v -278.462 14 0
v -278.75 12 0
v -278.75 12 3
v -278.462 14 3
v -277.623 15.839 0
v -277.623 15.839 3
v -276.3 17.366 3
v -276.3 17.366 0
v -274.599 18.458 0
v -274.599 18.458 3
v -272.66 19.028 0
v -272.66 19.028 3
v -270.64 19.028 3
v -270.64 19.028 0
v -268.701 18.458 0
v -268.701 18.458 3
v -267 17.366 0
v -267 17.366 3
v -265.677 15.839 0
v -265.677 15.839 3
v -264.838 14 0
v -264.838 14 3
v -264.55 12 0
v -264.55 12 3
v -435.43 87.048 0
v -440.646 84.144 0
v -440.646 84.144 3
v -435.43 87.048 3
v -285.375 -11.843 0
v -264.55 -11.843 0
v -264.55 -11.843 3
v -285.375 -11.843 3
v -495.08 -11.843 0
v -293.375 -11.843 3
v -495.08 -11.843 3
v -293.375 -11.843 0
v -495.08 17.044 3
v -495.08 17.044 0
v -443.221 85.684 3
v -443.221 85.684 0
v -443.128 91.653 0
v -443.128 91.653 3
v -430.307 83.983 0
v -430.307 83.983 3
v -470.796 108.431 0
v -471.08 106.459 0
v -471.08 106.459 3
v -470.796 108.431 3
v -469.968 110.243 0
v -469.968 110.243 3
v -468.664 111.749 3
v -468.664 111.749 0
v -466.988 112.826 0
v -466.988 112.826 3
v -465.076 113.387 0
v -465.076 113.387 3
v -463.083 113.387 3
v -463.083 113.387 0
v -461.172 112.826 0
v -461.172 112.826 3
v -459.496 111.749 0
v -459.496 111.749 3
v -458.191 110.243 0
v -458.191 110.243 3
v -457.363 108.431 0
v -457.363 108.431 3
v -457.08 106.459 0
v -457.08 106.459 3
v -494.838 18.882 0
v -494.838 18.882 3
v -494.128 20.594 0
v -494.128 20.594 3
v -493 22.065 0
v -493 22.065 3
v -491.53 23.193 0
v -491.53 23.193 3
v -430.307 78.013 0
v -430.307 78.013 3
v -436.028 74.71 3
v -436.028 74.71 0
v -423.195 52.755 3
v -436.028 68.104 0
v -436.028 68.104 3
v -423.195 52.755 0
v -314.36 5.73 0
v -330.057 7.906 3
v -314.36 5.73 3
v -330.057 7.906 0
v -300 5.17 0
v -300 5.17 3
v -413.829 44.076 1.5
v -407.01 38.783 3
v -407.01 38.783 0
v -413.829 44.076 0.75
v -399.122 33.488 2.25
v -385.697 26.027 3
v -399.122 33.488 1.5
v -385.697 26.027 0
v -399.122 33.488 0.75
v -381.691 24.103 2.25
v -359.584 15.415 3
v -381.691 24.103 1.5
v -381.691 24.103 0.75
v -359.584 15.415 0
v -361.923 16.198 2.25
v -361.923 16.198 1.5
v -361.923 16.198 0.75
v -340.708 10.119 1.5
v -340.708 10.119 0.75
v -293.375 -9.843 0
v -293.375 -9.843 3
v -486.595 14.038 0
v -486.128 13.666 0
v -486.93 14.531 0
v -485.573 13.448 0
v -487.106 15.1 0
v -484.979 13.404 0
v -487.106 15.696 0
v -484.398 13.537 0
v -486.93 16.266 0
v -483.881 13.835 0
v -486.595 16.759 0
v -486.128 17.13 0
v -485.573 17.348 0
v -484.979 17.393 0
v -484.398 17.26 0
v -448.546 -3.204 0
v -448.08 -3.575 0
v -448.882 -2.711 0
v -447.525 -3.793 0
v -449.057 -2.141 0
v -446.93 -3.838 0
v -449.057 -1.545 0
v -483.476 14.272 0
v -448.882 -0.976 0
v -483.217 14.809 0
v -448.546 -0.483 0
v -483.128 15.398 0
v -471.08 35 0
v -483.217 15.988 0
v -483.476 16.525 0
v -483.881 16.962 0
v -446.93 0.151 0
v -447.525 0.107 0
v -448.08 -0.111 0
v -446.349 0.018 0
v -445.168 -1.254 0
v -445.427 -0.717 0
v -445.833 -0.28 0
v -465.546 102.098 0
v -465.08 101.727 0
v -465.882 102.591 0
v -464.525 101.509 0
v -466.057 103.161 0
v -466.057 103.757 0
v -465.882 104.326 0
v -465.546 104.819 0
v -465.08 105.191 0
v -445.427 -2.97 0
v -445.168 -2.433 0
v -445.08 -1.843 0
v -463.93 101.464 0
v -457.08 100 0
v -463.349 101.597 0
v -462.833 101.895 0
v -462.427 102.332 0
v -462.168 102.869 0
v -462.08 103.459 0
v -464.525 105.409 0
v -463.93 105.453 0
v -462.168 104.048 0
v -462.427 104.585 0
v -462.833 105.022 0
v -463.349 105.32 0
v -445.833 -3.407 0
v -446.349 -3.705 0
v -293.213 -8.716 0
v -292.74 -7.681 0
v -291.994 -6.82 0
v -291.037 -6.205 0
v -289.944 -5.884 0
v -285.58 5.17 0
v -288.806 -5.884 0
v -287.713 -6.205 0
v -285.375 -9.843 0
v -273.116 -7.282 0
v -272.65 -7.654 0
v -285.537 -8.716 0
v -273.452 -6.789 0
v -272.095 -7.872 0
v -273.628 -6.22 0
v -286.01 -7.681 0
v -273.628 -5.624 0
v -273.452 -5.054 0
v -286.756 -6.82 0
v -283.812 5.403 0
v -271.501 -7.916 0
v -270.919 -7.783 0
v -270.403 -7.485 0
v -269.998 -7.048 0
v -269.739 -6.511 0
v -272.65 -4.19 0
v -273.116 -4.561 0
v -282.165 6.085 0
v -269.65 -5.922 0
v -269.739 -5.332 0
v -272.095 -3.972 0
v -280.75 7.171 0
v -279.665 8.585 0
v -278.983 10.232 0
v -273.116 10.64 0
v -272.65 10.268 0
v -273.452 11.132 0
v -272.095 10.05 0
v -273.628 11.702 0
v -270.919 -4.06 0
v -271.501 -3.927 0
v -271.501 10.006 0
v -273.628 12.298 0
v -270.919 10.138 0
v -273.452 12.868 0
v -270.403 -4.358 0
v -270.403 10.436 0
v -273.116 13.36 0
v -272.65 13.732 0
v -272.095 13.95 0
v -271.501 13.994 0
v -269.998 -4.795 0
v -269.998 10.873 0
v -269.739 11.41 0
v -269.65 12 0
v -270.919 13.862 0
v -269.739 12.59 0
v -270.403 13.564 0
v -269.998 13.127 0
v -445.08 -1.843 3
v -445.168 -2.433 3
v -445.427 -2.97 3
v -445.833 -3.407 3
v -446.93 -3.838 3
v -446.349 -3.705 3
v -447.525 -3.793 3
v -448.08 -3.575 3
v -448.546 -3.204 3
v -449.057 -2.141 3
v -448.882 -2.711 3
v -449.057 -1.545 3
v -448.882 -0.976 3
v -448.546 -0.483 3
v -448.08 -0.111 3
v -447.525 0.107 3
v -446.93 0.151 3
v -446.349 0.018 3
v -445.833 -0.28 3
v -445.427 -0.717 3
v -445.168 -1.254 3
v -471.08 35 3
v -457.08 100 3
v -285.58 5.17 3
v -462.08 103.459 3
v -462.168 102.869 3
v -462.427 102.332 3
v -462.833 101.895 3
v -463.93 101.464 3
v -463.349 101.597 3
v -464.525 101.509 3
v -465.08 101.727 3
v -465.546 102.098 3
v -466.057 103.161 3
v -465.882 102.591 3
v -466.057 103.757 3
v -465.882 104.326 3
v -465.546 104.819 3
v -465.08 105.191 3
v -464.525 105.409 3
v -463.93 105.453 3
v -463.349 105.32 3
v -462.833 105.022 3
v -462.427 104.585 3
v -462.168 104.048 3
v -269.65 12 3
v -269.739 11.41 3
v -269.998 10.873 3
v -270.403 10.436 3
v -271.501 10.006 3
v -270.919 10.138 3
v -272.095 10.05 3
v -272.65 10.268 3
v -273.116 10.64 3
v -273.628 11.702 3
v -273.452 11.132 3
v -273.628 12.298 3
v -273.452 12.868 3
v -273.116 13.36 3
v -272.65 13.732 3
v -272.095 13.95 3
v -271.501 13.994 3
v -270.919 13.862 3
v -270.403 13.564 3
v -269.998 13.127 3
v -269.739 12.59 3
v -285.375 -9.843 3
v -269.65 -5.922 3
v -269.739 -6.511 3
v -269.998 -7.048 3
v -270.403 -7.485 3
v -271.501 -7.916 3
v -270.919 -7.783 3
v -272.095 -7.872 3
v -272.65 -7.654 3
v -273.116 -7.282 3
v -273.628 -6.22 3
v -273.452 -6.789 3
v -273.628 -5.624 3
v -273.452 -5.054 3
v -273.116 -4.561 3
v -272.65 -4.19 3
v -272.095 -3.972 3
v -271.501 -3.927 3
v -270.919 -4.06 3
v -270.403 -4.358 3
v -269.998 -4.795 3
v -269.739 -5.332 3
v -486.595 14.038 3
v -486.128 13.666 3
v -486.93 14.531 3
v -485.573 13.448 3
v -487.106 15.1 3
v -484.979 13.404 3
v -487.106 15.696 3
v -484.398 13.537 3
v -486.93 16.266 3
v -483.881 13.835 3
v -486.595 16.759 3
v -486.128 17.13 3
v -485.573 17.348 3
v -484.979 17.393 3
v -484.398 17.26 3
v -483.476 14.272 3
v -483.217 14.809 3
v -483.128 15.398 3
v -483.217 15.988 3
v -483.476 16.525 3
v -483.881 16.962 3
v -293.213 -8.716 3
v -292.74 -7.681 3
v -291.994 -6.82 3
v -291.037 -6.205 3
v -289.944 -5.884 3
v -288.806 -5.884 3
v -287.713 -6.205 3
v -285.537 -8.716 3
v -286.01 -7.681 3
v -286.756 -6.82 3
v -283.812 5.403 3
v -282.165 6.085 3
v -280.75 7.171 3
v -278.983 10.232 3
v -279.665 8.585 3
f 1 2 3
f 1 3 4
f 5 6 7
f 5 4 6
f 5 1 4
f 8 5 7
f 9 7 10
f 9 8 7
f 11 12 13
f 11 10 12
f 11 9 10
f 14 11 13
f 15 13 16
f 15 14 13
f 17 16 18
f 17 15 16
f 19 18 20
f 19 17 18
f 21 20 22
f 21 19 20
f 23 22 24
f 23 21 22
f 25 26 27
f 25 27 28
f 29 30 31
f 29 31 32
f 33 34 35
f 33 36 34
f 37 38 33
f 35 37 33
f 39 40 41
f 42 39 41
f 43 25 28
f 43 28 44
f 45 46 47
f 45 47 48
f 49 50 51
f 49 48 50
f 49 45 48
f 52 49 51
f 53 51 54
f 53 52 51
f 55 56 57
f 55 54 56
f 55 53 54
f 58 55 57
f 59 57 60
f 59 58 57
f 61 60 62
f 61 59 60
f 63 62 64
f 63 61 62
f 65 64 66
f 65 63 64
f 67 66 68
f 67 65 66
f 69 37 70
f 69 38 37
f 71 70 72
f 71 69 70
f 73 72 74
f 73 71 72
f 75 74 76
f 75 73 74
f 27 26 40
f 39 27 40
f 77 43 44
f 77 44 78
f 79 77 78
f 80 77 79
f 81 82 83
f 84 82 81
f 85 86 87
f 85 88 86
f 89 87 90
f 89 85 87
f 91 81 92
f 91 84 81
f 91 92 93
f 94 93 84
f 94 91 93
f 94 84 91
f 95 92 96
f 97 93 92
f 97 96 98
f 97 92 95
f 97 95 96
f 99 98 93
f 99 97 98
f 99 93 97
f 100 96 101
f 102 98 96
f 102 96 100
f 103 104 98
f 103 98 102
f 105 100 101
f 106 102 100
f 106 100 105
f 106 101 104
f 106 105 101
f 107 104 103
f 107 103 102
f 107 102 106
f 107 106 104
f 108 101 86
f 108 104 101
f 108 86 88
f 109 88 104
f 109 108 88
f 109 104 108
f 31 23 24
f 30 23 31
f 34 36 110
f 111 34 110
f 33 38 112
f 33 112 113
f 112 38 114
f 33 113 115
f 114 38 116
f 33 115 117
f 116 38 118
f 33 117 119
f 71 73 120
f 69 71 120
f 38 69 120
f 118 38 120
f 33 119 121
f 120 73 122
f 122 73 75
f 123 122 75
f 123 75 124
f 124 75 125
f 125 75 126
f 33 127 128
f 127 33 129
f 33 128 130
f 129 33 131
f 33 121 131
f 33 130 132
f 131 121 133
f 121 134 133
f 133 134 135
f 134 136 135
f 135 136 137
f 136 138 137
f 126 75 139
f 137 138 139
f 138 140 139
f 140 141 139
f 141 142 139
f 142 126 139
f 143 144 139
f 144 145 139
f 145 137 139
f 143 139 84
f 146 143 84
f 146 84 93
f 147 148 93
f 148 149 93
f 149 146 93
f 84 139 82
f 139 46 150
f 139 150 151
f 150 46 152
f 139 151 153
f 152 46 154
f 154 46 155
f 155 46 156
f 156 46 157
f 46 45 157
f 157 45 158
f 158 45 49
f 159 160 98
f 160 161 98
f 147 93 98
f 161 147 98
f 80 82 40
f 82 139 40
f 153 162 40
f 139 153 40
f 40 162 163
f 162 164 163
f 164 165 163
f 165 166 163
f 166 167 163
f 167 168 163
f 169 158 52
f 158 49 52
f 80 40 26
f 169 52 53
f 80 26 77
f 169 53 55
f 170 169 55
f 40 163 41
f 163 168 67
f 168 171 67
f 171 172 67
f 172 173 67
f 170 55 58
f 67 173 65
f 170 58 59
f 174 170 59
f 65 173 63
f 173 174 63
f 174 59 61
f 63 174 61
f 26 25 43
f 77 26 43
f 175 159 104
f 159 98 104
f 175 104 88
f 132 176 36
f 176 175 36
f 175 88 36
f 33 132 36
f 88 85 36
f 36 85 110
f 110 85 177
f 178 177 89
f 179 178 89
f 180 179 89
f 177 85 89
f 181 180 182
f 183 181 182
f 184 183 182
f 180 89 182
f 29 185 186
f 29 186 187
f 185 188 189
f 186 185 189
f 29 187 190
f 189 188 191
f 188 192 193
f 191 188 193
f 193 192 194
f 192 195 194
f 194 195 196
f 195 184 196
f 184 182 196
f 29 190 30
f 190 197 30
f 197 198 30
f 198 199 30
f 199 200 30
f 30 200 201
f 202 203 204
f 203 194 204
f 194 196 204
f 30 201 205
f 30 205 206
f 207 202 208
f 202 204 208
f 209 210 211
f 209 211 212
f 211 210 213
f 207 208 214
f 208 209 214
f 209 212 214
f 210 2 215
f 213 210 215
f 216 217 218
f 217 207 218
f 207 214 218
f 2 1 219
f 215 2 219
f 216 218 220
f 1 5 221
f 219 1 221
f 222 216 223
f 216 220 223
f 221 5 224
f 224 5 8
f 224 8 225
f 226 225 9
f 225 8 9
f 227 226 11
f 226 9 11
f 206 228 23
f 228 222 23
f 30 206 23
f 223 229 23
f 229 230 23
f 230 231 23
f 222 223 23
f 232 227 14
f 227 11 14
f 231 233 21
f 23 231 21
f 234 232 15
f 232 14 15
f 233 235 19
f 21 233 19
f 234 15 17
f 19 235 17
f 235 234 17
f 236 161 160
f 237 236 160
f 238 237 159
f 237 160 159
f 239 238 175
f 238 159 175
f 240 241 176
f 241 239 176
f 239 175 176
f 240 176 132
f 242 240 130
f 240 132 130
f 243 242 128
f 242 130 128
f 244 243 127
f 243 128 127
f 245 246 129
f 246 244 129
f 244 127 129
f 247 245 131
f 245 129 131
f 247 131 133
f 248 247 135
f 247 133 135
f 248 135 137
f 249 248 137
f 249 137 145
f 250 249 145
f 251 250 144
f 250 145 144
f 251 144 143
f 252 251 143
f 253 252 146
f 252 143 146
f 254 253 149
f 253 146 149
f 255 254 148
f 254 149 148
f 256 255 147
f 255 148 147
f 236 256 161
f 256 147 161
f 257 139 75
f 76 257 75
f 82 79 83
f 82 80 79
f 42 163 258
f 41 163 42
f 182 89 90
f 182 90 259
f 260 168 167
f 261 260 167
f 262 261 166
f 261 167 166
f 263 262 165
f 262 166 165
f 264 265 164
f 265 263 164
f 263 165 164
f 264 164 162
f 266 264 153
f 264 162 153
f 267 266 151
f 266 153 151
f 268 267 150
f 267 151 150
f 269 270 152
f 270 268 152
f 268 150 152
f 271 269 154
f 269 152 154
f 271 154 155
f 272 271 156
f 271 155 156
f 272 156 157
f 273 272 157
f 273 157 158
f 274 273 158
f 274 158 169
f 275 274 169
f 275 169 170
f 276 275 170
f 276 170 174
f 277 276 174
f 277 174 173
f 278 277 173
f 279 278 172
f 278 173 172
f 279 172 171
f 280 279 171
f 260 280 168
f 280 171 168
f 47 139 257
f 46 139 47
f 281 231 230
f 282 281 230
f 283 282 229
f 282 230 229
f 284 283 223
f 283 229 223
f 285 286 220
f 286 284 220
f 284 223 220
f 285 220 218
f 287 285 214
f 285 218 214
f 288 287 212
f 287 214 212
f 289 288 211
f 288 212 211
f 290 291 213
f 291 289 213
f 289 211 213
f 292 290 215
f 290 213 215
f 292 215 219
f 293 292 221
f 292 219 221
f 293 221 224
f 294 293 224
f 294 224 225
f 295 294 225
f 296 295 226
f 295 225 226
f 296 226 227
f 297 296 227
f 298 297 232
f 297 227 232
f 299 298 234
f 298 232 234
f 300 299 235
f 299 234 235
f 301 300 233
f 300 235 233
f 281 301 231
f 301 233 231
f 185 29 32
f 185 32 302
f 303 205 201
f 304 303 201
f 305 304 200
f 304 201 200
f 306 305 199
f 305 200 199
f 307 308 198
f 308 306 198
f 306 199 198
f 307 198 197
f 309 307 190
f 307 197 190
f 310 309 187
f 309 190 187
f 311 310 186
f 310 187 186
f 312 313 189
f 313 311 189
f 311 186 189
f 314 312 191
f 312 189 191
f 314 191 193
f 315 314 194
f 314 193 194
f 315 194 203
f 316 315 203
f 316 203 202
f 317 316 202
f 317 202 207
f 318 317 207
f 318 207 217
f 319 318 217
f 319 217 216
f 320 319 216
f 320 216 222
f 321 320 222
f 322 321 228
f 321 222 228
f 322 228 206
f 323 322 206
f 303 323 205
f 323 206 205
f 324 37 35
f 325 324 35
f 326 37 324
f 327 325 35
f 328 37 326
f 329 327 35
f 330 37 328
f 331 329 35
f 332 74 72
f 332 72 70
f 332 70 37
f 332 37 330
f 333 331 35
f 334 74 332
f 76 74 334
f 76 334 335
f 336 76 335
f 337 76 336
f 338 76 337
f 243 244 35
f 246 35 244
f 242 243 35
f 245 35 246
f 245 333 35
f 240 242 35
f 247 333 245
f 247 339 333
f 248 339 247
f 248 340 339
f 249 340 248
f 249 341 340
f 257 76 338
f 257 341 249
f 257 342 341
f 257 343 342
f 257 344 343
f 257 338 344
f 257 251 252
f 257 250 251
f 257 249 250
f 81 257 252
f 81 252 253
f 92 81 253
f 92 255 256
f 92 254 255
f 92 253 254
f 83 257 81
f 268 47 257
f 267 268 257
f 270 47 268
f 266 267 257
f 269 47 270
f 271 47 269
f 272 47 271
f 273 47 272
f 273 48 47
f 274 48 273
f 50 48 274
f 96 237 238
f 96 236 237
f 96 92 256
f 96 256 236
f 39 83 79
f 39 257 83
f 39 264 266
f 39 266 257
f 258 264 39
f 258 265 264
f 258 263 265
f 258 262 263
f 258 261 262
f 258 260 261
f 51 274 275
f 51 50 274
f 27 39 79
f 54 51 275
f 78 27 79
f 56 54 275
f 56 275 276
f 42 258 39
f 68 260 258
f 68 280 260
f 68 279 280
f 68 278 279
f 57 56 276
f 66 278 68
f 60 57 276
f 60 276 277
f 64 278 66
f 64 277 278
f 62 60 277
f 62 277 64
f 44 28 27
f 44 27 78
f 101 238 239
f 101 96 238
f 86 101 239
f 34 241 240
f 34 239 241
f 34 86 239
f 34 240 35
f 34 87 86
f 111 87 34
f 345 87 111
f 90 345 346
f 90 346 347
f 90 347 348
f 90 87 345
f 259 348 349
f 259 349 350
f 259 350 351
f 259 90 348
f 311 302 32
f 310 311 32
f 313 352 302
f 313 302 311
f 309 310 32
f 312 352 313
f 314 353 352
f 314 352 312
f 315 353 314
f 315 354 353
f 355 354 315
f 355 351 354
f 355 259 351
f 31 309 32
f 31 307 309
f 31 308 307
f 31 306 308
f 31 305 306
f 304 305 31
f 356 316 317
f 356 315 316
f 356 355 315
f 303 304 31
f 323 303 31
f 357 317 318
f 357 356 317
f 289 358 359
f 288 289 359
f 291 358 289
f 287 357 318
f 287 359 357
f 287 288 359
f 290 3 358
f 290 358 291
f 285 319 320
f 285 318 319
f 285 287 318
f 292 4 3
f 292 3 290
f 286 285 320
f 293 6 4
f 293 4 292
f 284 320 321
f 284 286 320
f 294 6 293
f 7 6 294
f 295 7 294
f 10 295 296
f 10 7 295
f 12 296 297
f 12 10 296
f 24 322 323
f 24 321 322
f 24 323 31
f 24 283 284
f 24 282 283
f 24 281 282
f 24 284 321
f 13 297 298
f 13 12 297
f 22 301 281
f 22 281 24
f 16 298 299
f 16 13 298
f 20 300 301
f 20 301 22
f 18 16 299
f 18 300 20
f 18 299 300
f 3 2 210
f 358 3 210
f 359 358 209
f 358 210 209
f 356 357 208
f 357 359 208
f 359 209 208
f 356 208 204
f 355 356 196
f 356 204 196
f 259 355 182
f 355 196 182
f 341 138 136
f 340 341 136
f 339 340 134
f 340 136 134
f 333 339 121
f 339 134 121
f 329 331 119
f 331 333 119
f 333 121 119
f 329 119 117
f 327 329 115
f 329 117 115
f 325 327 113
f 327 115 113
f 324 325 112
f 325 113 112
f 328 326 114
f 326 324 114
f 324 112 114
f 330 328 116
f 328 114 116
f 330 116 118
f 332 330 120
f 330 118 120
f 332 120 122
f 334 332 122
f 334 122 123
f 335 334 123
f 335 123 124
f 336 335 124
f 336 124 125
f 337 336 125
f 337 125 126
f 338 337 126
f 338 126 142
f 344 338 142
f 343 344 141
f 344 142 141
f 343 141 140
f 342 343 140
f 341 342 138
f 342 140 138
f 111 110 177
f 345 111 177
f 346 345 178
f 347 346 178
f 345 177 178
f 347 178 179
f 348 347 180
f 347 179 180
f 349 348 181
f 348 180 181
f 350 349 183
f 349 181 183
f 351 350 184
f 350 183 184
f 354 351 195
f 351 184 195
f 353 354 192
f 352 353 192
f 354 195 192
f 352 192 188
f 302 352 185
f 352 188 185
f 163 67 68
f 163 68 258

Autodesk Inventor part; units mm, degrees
ref_plane "YZ Plane" through (0, 0, 0) normal (1, 0, 0) x (0, 1, 0)
ref_plane "XZ Plane" through (0, 0, 0) normal (0, 1, 0) x (-1, 0, 0)
ref_plane "XY Plane" through (0, 0, 0) normal (0, 0, 1) x (1, 0, 0)
sketch "Sketch3" plane through (0, 0, 0) normal (0, 0, 1) x (1, 0, 0)
  circle A0 centre (367.816, 50) radius 50 construction
  line L0 (367.816, 0) -> (512.7041, 0) construction
  line L1 (367.816, 50) -> (512.7041, 50) construction
  line L2 (367.816, 100) -> (512.7041, 100) construction
  line L3 (367.816, 50) -> (342.816, 6.6987) construction
  line L4 (367.816, 50) -> (324.5147, 25) construction
  line L5 (367.816, 50) -> (324.5147, 75) construction
  line L6 (342.816, 93.3013) -> (367.816, 50) construction
  line L7 (392.816, 93.3013) -> (367.816, 50) construction
  line L8 (411.1173, 75) -> (367.816, 50) construction
  line L9 (411.1173, 25) -> (367.816, 50) construction
  line L10 (392.816, 6.6987) -> (367.816, 50) construction
  line L11 (367.816, 0) -> (367.816, 100) construction
  line L12 (417.816, 50) -> (367.816, 50) construction
  line L13 (341.6361, 0) -> (341.6361, 100) construction
  line L14 (315.4561, 0) -> (315.4561, 100) construction
  line L15 (289.2762, 0) -> (289.2762, 100) construction
  line L16 (263.0963, 0) -> (263.0963, 100) construction
  line L17 (236.9163, 0) -> (236.9163, 100) construction
  line L18 (210.7364, 0) -> (210.7364, 100) construction
  line L19 (184.5564, 0) -> (184.5564, 100) construction
  line L20 (158.3765, 0) -> (158.3765, 100) construction
  circle A1 centre (315.4561, 50) radius 50 construction
  circle A2 centre (341.6361, 50) radius 50 construction
  circle A3 centre (289.2762, 50) radius 50 construction
  circle A4 centre (263.0963, 50) radius 50 construction
  circle A5 centre (236.9163, 50) radius 50 construction
  circle A6 centre (210.7364, 50) radius 50 construction
  line L21 (392.816, 6.6987) -> (512.7041, 6.6987) construction
  line L22 (411.1173, 25) -> (512.7041, 25) construction
  line L23 (411.1173, 75) -> (512.7041, 75) construction
  line L24 (411.1173, 75) -> (512.7041, 75) construction
  line L25 (392.816, 93.3013) -> (512.7041, 93.3013) construction
  line L26 (358.7574, 75) -> (339.2762, 50) construction
  line L27 (339.2762, 50) -> (306.3975, 25) construction
  line L28 (306.3975, 25) -> (261.9163, 6.6987) construction
  line L29 (261.9163, 6.6987) -> (210.7364, 0) construction
  line L30 (105.3682, -12.9392) -> (105.3682, 124.4333) construction
  line L31 (21.25, 0) -> (21.25, 12)
  line L32 (35.45, 12) -> (35.45, -11.8433)
  arc A7 (0, 0) -> (6.625, -9.8433) centre (10.625, 0) ccw
  arc A8 (14.625, -9.8433) -> (21.25, 0) centre (10.625, 0) ccw
  line L33 (35.45, -11.8433) -> (14.625, -11.8433)
  line L34 (6.625, -11.8433) -> (-195.0796, -11.8433)
  circle A9 centre (-144.26, 100.8473) radius 12.875 construction
  line L35 (6.625, -11.8433) -> (6.625, -9.8433)
  line L36 (14.625, -11.8433) -> (14.625, -9.8433)
  line L37 (411.1173, 75) -> (158.3765, 75) construction
  line L38 (367.816, 100) -> (158.3765, 100) construction
  line L39 (417.816, 50) -> (158.3765, 50) construction
  line L40 (411.1173, 25) -> (158.3765, 25) construction
  line L41 (392.816, 6.6987) -> (158.3765, 6.6987) construction
  line L42 (392.816, 93.3013) -> (158.3765, 93.3013) construction
  line L43 (358.7574, 75) -> (366.6361, 93.3013) construction
  line L44 (366.6361, 93.3013) -> (367.816, 100) construction
  spline S0 degree 4 poles (-157.0796, 100) (-157.0796, 88.9946) (-147.011, 72.6811) (-131.8577, 48.7932) (-88.4777, 17.6268) (-50.0176, 3.937) (-18.8717, 0) (0, 0) knots 0 0 0 0 0 0.264547 0.457223 0.66608 1 1 1 1 1
  line L45 (-157.0796, 100) -> (-157.0796, 38) construction
  line L46 (0, 0) -> (-157.0796, 0) construction
  line L47 (-144.26, 100.8473) -> (-157.135, 100.8473) construction
  circle A10 centre (-146.4546, 100) radius 10.625 construction
  line L48 (-146.4546, 100) -> (-157.0796, 100) construction
  line L49 (-141.0754, 84.4005) -> (-135.6205, 93.5183) construction
  line L50 (-141.0796, 132.0528) -> (-171.0796, 149.3733) construction
  line L51 (-171.0796, 149.3733) -> (-201.0796, 132.0528) construction
  line L52 (-141.0754, 84.4005) -> (-99.2801, 84.4005) construction
  line L53 (-201.0796, 132.0528) -> (-201.0796, 97.4118) construction
  line L54 (-201.0796, 97.4118) -> (-171.0796, 80.0913) construction
  line L55 (0, 0) -> (-157.0796, 93.9753) construction
  line L56 (-135.6205, 93.5183) -> (-137.3368, 94.5451) construction
  line L57 (-137.3368, 94.5451) -> (-143.2815, 84.6085) construction
  line L58 (-137.3368, 94.5451) -> (-171.0796, 114.7323) construction
  line L59 (-201.0796, 132.0528) -> (-171.0796, 114.7323) construction
  arc A11 (-137.3368, 94.5451) -> (-144.7045, 143.8948) centre (-171.0796, 114.7323) ccw construction
  arc A12 (-142.7917, 85.4273) -> (-147.1443, 147.6882) centre (-171.0796, 114.7323) ccw construction
  line L60 (-171.0796, 80.0913) -> (-171.0796, 35)
  circle A13 centre (-171.0796, 114.7323) radius 2.5 construction
  arc A14 (-167.4345, 120.8251) -> (-174.7248, 108.6394) centre (-171.0796, 114.7323) ccw construction
  line L61 (-167.4345, 120.8251) -> (-157.0796, 114.6302) construction
  line L62 (-171.0796, 80.0913) -> (-171.0796, 106.4587)
  line L63 (-171.0796, 106.4587) -> (-174.7248, 108.6394) construction
  line L64 (-171.0796, 35) -> (-191.5296, 23.1932)
  arc A15 (-191.5296, 23.1932) -> (-195.0796, 17.0444) centre (-187.9796, 17.0444) ccw
  line L65 (-195.0796, 17.0444) -> (-195.0796, -11.8433)
  arc A16 (35.45, 12) -> (21.25, 12) centre (28.35, 12) ccw
  line L66 (-157.0796, 114.6302) -> (-157.0796, 99.9865) construction
  circle A17 centre (-164.0796, 103.4587) radius 2
  line L67 (-171.0796, 103.4587) -> (-157.0796, 103.4587) construction
  circle A18 centre (-185.1284, 15.3983) radius 2
  line L68 (-185.1284, 15.3983) -> (-194.1284, 20.5944) construction
  circle A19 centre (-6, -5.9217) radius 2
  line L69 (-6, -11.8433) -> (-6, 0) construction
  circle A20 centre (28.35, 12) radius 2
  circle A21 centre (28.35, -5.9217) radius 2
  line L70 (-167.4345, 320.8251) -> (-157.0796, 314.6302) construction
  arc A22 (-167.4345, 320.8251) -> (-174.7248, 308.6394) centre (-171.0796, 314.7323) ccw construction
  circle A23 centre (-171.0796, 314.7323) radius 2.5 construction
  line L71 (-171.0796, 280.0913) -> (-171.0796, 306.4587)
  line L72 (-171.0796, 306.4587) -> (-174.7248, 308.6394) construction
  line L73 (-157.0796, 314.6302) -> (-157.0796, 299.9865) construction
  circle A24 centre (-164.0796, 303.4587) radius 2
  spline S1 degree 4 poles (-157.0796, 300) (-157.0796, 288.9946) (-147.0234, 272.6841) (-124.1789, 236.7977) (-70.8039, 208.0704) (-31.8865, 200.2943) (0, 200) knots 0 0 0 0 0 0.264547 0.457223 1 1 1 1 1 construction
  line L74 (-157.0796, 300) -> (-157.0796, 238) construction
  arc A25 (0, 200) -> (6.625, 190.1567) centre (10.625, 200) ccw
  line L75 (35.45, 212) -> (35.45, 188.1567)
  circle A26 centre (28.35, 212) radius 2
  circle A27 centre (28.35, 194.0783) radius 2
  arc A28 (35.45, 212) -> (21.25, 212) centre (28.35, 212) ccw
  line L76 (21.25, 200) -> (21.25, 212)
  line L77 (35.45, 188.1567) -> (14.625, 188.1567)
  arc A29 (14.625, 190.1567) -> (21.25, 200) centre (10.625, 200) ccw
  line L78 (14.625, 188.1567) -> (14.625, 190.1567)
  line L79 (-185.1284, 215.3983) -> (-194.1284, 220.5944) construction
  arc A30 (-191.5296, 223.1932) -> (-195.0796, 217.0444) centre (-187.9796, 217.0444) ccw
  line L80 (-195.0796, 217.0444) -> (-195.0796, 188.1567)
  line L81 (-171.0796, 235) -> (-191.5296, 223.1932)
  circle A31 centre (-185.1284, 215.3983) radius 2
  line L82 (-171.0796, 280.0913) -> (-171.0796, 235)
  line L83 (6.625, 188.1567) -> (-195.0796, 188.1567)
  line L84 (6.625, 188.1567) -> (6.625, 190.1567)
  line L85 (-137.3368, 294.5451) -> (-143.2815, 284.6085) construction
  line L86 (-141.0754, 284.4005) -> (-135.6205, 293.5183) construction
  line L87 (0, 200) -> (-157.0796, 293.9753)
  line L88 (-167.4345, 520.8251) -> (-157.0796, 514.6302) construction
  arc A32 (-167.4345, 520.8251) -> (-174.7248, 508.6394) centre (-171.0796, 514.7323) ccw construction
  circle A33 centre (-171.0796, 514.7323) radius 2.5 construction
  line L89 (-171.0796, 480.0913) -> (-171.0796, 506.4587)
  line L90 (-171.0796, 506.4587) -> (-174.7248, 508.6394) construction
  line L91 (-157.0796, 514.6302) -> (-157.0796, 499.9865) construction
  circle A34 centre (-164.0796, 503.4587) radius 2
  spline S2 degree 4 poles (-157.0796, 500) (-157.0796, 488.9946) (-147.0234, 472.6841) (-124.1789, 436.7977) (-70.8039, 408.0704) (-31.8865, 400.2943) (0, 400) knots 0 0 0 0 0 0.264547 0.457223 1 1 1 1 1 construction
  line L92 (-157.0796, 500) -> (-157.0796, 438)
  arc A35 (0, 400) -> (6.625, 390.1567) centre (10.625, 400) ccw
  line L93 (35.45, 412) -> (35.45, 388.1567)
  circle A36 centre (28.35, 412) radius 2
  circle A37 centre (28.35, 394.0783) radius 2
  arc A38 (35.45, 412) -> (21.25, 412) centre (28.35, 412) ccw
  line L94 (21.25, 400) -> (21.25, 412)
  line L95 (35.45, 388.1567) -> (14.625, 388.1567)
  arc A39 (14.625, 390.1567) -> (21.25, 400) centre (10.625, 400) ccw
  line L96 (14.625, 388.1567) -> (14.625, 390.1567)
  line L97 (-185.1284, 415.3983) -> (-194.1284, 420.5944) construction
  arc A40 (-191.5296, 423.1932) -> (-195.0796, 417.0444) centre (-187.9796, 417.0444) ccw
  line L98 (-195.0796, 417.0444) -> (-195.0796, 388.1567)
  line L99 (-171.0796, 435) -> (-191.5296, 423.1932)
  circle A41 centre (-185.1284, 415.3983) radius 2
  line L100 (-171.0796, 480.0913) -> (-171.0796, 435)
  line L101 (6.625, 388.1567) -> (-195.0796, 388.1567)
  line L102 (6.625, 388.1567) -> (6.625, 390.1567)
  line L103 (-137.3368, 494.5451) -> (-143.2815, 484.6085) construction
  line L104 (-141.0754, 484.4005) -> (-135.6205, 493.5183) construction
  line L105 (0, 400) -> (-157.0796, 493.9753) construction
  line L106 (-467.4345, 120.8251) -> (-457.0796, 114.6302) construction
  arc A42 (-467.4345, 120.8251) -> (-474.7248, 108.6394) centre (-471.0796, 114.7323) ccw construction
  circle A43 centre (-471.0796, 114.7323) radius 2.5 construction
  line L107 (-471.0796, 80.0913) -> (-471.0796, 106.4587)
  line L108 (-471.0796, 106.4587) -> (-474.7248, 108.6394) construction
  line L109 (-457.0796, 114.6302) -> (-457.0796, 99.9865) construction
  circle A44 centre (-464.0796, 103.4587) radius 2
  spline S3 degree 4 poles (-457.0796, 100) (-457.0796, 88.9946) (-447.0234, 72.6841) (-424.1789, 36.7977) (-370.8039, 8.0704) (-331.8865, 0.2943) (-300, 0) knots 0 0 0 0 0 0.264547 0.457223 1 1 1 1 1 construction
  line L110 (-457.0796, 100) -> (-457.0796, 38) construction
  arc A45 (-300, 0) -> (-293.375, -9.8433) centre (-289.375, 0) ccw construction
  line L111 (-264.55, 12) -> (-264.55, -11.8433)
  circle A46 centre (-271.65, 12) radius 2
  circle A47 centre (-271.65, -5.9217) radius 2
  arc A48 (-264.55, 12) -> (-278.75, 12) centre (-271.65, 12) ccw
  line L112 (-278.75, 0) -> (-278.75, 12) construction
  line L113 (-264.55, -11.8433) -> (-285.375, -11.8433)
  arc A49 (-285.375, -9.8433) -> (-278.75, 0) centre (-289.375, 0) ccw construction
  line L114 (-285.375, -11.8433) -> (-285.375, -9.8433) construction
  line L115 (-485.1284, 15.3983) -> (-494.1284, 20.5944) construction
  arc A50 (-491.5296, 23.1932) -> (-495.0796, 17.0444) centre (-487.9796, 17.0444) ccw
  line L116 (-495.0796, 17.0444) -> (-495.0796, -11.8433)
  line L117 (-471.0796, 35) -> (-491.5296, 23.1932)
  circle A51 centre (-485.1284, 15.3983) radius 2
  line L118 (-471.0796, 80.0913) -> (-471.0796, 35)
  line L119 (-293.375, -11.8433) -> (-495.0796, -11.8433)
  line L120 (-293.375, -11.8433) -> (-293.375, -9.8433) construction
  line L121 (-437.3368, 94.5451) -> (-443.2815, 84.6085) construction
  line L122 (-441.0754, 84.4005) -> (-435.6205, 93.5183) construction
  line L123 (-300, 0) -> (-457.0796, 93.9753) construction
  line L124 (-467.4345, 320.8251) -> (-457.0796, 314.6302) construction
  arc A52 (-467.4345, 320.8251) -> (-474.7248, 308.6394) centre (-471.0796, 314.7323) ccw construction
  circle A53 centre (-471.0796, 314.7323) radius 2.5 construction
  line L125 (-471.0796, 280.0913) -> (-471.0796, 306.4587)
  line L126 (-471.0796, 306.4587) -> (-474.7248, 308.6394) construction
  line L127 (-457.0796, 314.6302) -> (-457.0796, 299.9865) construction
  circle A54 centre (-464.0796, 303.4587) radius 2
  spline S4 degree 4 poles (-457.0796, 300) (-457.0796, 288.9946) (-447.0234, 272.6841) (-424.1789, 236.7977) (-370.8039, 208.0704) (-331.8865, 200.2943) (-300, 200) knots 0 0 0 0 0 0.264547 0.457223 1 1 1 1 1 construction
  line L128 (-457.0796, 300) -> (-457.0796, 238) construction
  arc A55 (-300, 200) -> (-293.375, 190.1567) centre (-289.375, 200) ccw construction
  line L129 (-264.55, 212) -> (-264.55, 188.1567)
  circle A56 centre (-271.65, 212) radius 2
  circle A57 centre (-271.65, 194.0783) radius 2
  arc A58 (-264.55, 212) -> (-278.75, 212) centre (-271.65, 212) ccw
  line L130 (-278.75, 200) -> (-278.75, 212) construction
  line L131 (-264.55, 188.1567) -> (-285.375, 188.1567)
  arc A59 (-285.375, 190.1567) -> (-278.75, 200) centre (-289.375, 200) ccw construction
  line L132 (-285.375, 188.1567) -> (-285.375, 190.1567) construction
  line L133 (-485.1284, 215.3983) -> (-494.1284, 220.5944) construction
  arc A60 (-491.5296, 223.1932) -> (-495.0796, 217.0444) centre (-487.9796, 217.0444) ccw
  line L134 (-495.0796, 217.0444) -> (-495.0796, 188.1567)
  line L135 (-471.0796, 235) -> (-491.5296, 223.1932)
  circle A61 centre (-485.1284, 215.3983) radius 2
  line L136 (-471.0796, 280.0913) -> (-471.0796, 235)
  line L137 (-293.375, 188.1567) -> (-495.0796, 188.1567)
  line L138 (-293.375, 188.1567) -> (-293.375, 190.1567) construction
  line L139 (-437.3368, 294.5451) -> (-443.2815, 284.6085) construction
  line L140 (-441.0754, 284.4005) -> (-435.6205, 293.5183) construction
  line L141 (-300, 200) -> (-457.0796, 293.9753) construction
  line L142 (-467.4345, 520.8251) -> (-457.0796, 514.6302)
  arc A62 (-467.4345, 520.8251) -> (-474.7248, 508.6394) centre (-471.0796, 514.7323) ccw
  circle A63 centre (-471.0796, 514.7323) radius 2.5
  line L143 (-471.0796, 480.0913) -> (-471.0796, 506.4587)
  line L144 (-471.0796, 506.4587) -> (-474.7248, 508.6394)
  line L145 (-457.0796, 514.6302) -> (-457.0796, 499.9865)
  circle A64 centre (-464.0796, 503.4587) radius 2
  spline S5 degree 4 poles (-457.0796, 500) (-457.0796, 488.9946) (-447.0234, 472.6841) (-424.1789, 436.7977) (-370.8039, 408.0704) (-331.8865, 400.2943) (-300, 400) knots 0 0 0 0 0 0.264547 0.457223 1 1 1 1 1 construction
  line L146 (-457.0796, 500) -> (-457.0796, 438) construction
  arc A65 (-300, 400) -> (-293.375, 390.1567) centre (-289.375, 400) ccw construction
  line L147 (-264.55, 412) -> (-264.55, 388.1567) construction
  circle A66 centre (-271.65, 412) radius 2
  circle A67 centre (-271.65, 394.0783) radius 2
  arc A68 (-264.55, 412) -> (-278.75, 412) centre (-271.65, 412) ccw
  line L148 (-278.75, 400) -> (-278.75, 412) construction
  line L149 (-264.55, 388.1567) -> (-285.375, 388.1567)
  arc A69 (-285.375, 390.1567) -> (-278.75, 400) centre (-289.375, 400) ccw construction
  line L150 (-285.375, 388.1567) -> (-285.375, 390.1567) construction
  line L151 (-485.1284, 415.3983) -> (-494.1284, 420.5944) construction
  arc A70 (-491.5296, 423.1932) -> (-495.0796, 417.0444) centre (-487.9796, 417.0444) ccw
  line L152 (-495.0796, 417.0444) -> (-495.0796, 388.1567) construction
  line L153 (-471.0796, 435) -> (-491.5296, 423.1932)
  circle A71 centre (-485.1284, 415.3983) radius 2
  line L154 (-471.0796, 480.0913) -> (-471.0796, 435)
  line L155 (-293.375, 388.1567) -> (-495.0796, 388.1567)
  line L156 (-293.375, 388.1567) -> (-293.375, 390.1567) construction
  line L157 (-437.3368, 494.5451) -> (-443.2815, 484.6085) construction
  line L158 (-441.0754, 484.4005) -> (-435.6205, 493.5183) construction
  line L159 (-300, 400) -> (-457.0796, 493.9753) construction
  line L160 (-435.4304, 87.048) -> (-430.3073, 83.9831)
  line L161 (-430.3073, 83.9831) -> (-430.3073, 78.0131)
  line L162 (-457.0796, 100) -> (-443.128, 91.6532)
  line L163 (-443.2208, 85.684) -> (-443.128, 91.6532)
  line L164 (-440.6463, 84.1438) -> (-435.4304, 87.048)
  line L165 (-440.6463, 84.1438) -> (-443.2208, 85.684)
  line L166 (-430.3073, 78.0131) -> (-436.0283, 74.7101)
  line L167 (-436.0283, 74.7101) -> (-436.0283, 68.1041)
  spline S6 degree 4 poles (-439.3753, 72.7777) (-420.1522, 45.3403) (-398.6357, 22.4496) (-337.1208, 4.2654) (-300, 5.1701) knots 0 0 0 0 0 1 1 1 1 1
  line L168 (-293.375, -11.8433) -> (-285.375, -11.8433)
  line L169 (-157.0796, 293.9753) -> (-157.0796, 300)
  line L170 (-293.375, 188.1567) -> (-285.375, 188.1567)
  arc A72 (-157.0796, 438) -> (-119.0796, 400) centre (-119.0796, 438) ccw
  line L171 (-119.0796, 400) -> (0, 400)
  line L172 (-457.0796, 500) -> (-457.0796, 438) construction
  line L173 (-419.0796, 400) -> (-300, 400) construction
  arc A73 (-457.0796, 438) -> (-419.0796, 400) centre (-419.0796, 438) ccw construction
  line L174 (-457.0796, 300) -> (-443.128, 291.6532)
  line L175 (-443.2208, 285.684) -> (-443.128, 291.6532)
  line L176 (-440.6463, 284.1438) -> (-443.2208, 285.684)
  line L177 (-440.6463, 284.1438) -> (-435.4304, 287.048)
  line L178 (-435.4304, 287.048) -> (-430.3073, 283.9831)
  line L179 (-430.3073, 283.9831) -> (-430.3073, 278.0131) construction
  line L180 (-430.3073, 278.0131) -> (-436.0283, 274.7101) construction
  line L181 (-457.0796, 500) -> (-443.128, 491.6532)
  line L182 (-443.2208, 485.684) -> (-443.128, 491.6532)
  line L183 (-440.6463, 484.1438) -> (-443.2208, 485.684)
  line L184 (-440.6463, 484.1438) -> (-435.4304, 487.048)
  line L185 (-435.4304, 487.048) -> (-430.3073, 483.9831)
  line L186 (-430.3073, 483.9831) -> (-430.3073, 478.0131)
  line L187 (-430.3073, 478.0131) -> (-436.0283, 474.7101)
  line L188 (-430.3073, 283.9831) -> (-298.5715, 205.1701)
  line L189 (-293.375, 388.1567) -> (-285.375, 388.1567)
  line L190 (-300, 5.1701) -> (-285.5799, 5.1701)
  arc A74 (-285.5799, 5.1701) -> (-278.75, 12) centre (-285.5799, 12) ccw
  line L191 (-298.5715, 205.1701) -> (-285.5799, 205.1701)
  arc A75 (-285.5799, 205.1701) -> (-278.75, 212) centre (-285.5799, 212) ccw
  line L192 (-436.0283, 474.7101) -> (-451.9095, 465.5411)
  line L193 (-451.9095, 465.5411) -> (-451.9095, 438)
  arc A76 (-451.9095, 438) -> (-419.0796, 405.1701) centre (-419.0796, 438) ccw
  line L194 (-419.0796, 405.1701) -> (-285.5799, 405.1701)
  arc A77 (-285.5799, 405.1701) -> (-278.75, 412) centre (-285.5799, 412) ccw
  line L195 (-495.0796, 388.1567) -> (-514.2796, 388.1567)
  line L196 (-514.2796, 388.1567) -> (-514.2796, 392.1567)
  line L197 (-514.2796, 392.1567) -> (-498.0796, 392.1567)
  arc A78 (-498.0796, 392.1567) -> (-495.0796, 395.1567) centre (-498.0796, 395.1567) ccw
  line L198 (-495.0796, 395.1567) -> (-495.0796, 417.0444)
  line L199 (-499.0796, 388.1567) -> (-510.2796, 388.1567) construction
  line L200 (-510.2796, 388.1567) -> (-510.2796, 392.1567) construction
  line L201 (-510.2796, 392.1567) -> (-499.0796, 392.1567) construction
  line L202 (-499.0796, 392.1567) -> (-499.0796, 388.1567) construction
  line L203 (-499.0796, 388.1567) -> (-510.2796, 392.1567) construction
  line L204 (-510.2796, 388.1567) -> (-499.0796, 392.1567) construction
  arc A79 (-600, 200) -> (-593.375, 190.1567) centre (-589.375, 200) ccw construction
  line L205 (-564.55, 212) -> (-564.55, 188.1567) construction
  circle A80 centre (-571.65, 212) radius 2
  circle A81 centre (-571.65, 194.0783) radius 2
  arc A82 (-564.55, 212) -> (-578.75, 212) centre (-571.65, 212) ccw
  line L206 (-578.75, 200) -> (-578.75, 212) construction
  line L207 (-564.55, 188.1567) -> (-585.375, 188.1567)
  arc A83 (-585.375, 190.1567) -> (-578.75, 200) centre (-589.375, 200) ccw construction
  line L208 (-585.375, 188.1567) -> (-585.375, 190.1567) construction
  line L209 (-593.375, 188.1567) -> (-593.375, 190.1567) construction
  arc A84 (-585.5799, 205.1701) -> (-578.75, 212) centre (-585.5799, 212) ccw
  line L210 (-593.375, 188.1567) -> (-585.375, 188.1567)
  line L211 (-598.5715, 205.1701) -> (-585.5799, 205.1701)
  arc A85 (-791.5296, 223.1932) -> (-795.0796, 217.0444) centre (-787.9796, 217.0444) ccw
  line L212 (-785.1284, 215.3983) -> (-794.1284, 220.5944) construction
  circle A86 centre (-785.1284, 215.3983) radius 2
  line L213 (-771.0796, 235) -> (-791.5296, 223.1932)
  line L214 (-795.0796, 217.0444) -> (-795.0796, 188.1567) construction
  line L215 (-730.3073, 278.0131) -> (-736.0283, 274.7101) construction
  line L216 (-757.0796, 300) -> (-757.0796, 238) construction
  line L217 (-730.3073, 283.9831) -> (-730.3073, 278.0131) construction
  line L218 (-730.3073, 283.9831) -> (-598.5715, 205.1701)
  line L219 (-600, 200) -> (-757.0796, 293.9753) construction
  spline S7 degree 4 poles (-757.0796, 300) (-757.0796, 288.9946) (-747.0234, 272.6841) (-724.1789, 236.7977) (-670.8039, 208.0704) (-631.8865, 200.2943) (-600, 200) knots 0 0 0 0 0 0.264547 0.457223 1 1 1 1 1 construction
  line L220 (-593.375, 188.1567) -> (-795.0796, 188.1567)
  line L221 (-771.0796, 280.0913) -> (-771.0796, 235)
  line L222 (-757.0796, 300) -> (-743.128, 291.6532)
  line L223 (-743.2208, 285.684) -> (-743.128, 291.6532)
  line L224 (-740.6463, 284.1438) -> (-743.2208, 285.684)
  line L225 (-737.3368, 294.5451) -> (-743.2815, 284.6085) construction
  line L226 (-741.0754, 284.4005) -> (-735.6205, 293.5183) construction
  line L227 (-740.6463, 284.1438) -> (-735.4304, 287.048)
  line L228 (-735.4304, 287.048) -> (-730.3073, 283.9831)
  line L229 (-767.4345, 320.8251) -> (-757.0796, 314.6302)
  line L230 (-771.0796, 280.0913) -> (-771.0796, 306.4587)
  line L231 (-757.0796, 314.6302) -> (-757.0796, 299.9865)
  circle A87 centre (-764.0796, 303.4587) radius 2
  line L232 (-771.0796, 306.4587) -> (-774.7248, 308.6394)
  circle A88 centre (-771.0796, 314.7323) radius 2.5
  arc A89 (-767.4345, 320.8251) -> (-774.7248, 308.6394) centre (-771.0796, 314.7323) ccw
  line L233 (-795.0796, 188.1567) -> (-814.2796, 188.1567)
  line L234 (-814.2796, 188.1567) -> (-814.2796, 192.1567)
  line L235 (-814.2796, 192.1567) -> (-798.0796, 192.1567)
  arc A90 (-798.0796, 192.1567) -> (-795.0796, 195.1567) centre (-798.0796, 195.1567) ccw
  line L236 (-795.0796, 195.1567) -> (-795.0796, 217.0444)
  line L237 (-799.0796, 188.1567) -> (-810.2796, 188.1567) construction
  line L238 (-810.2796, 188.1567) -> (-810.2796, 192.1567) construction
  line L239 (-810.2796, 192.1567) -> (-799.0796, 192.1567) construction
  line L240 (-799.0796, 192.1567) -> (-799.0796, 188.1567) construction
  line L241 (-799.0796, 188.1567) -> (-810.2796, 192.1567) construction
  line L242 (-810.2796, 188.1567) -> (-799.0796, 192.1567) construction
  line L243 (-495.0796, 587.6927) -> (-264.55, 587.6927) construction
  line L244 (-379.8148, 587.6927) -> (-379.8148, 614.3146) construction
  line L245 (-795.0796, 438) -> (-564.55, 438) construction
  line L246 (-679.8148, 438) -> (-679.8148, 492.8294) construction
  arc A91 (-564.55, 195.1567) -> (-561.55, 192.1567) centre (-561.55, 195.1567) ccw
  line L247 (-545.35, 192.1567) -> (-561.55, 192.1567)
  line L248 (-545.35, 188.1567) -> (-545.35, 192.1567)
  line L249 (-560.55, 192.1567) -> (-560.55, 188.1567) construction
  line L250 (-560.55, 188.1567) -> (-549.35, 188.1567) construction
  line L251 (-564.55, 188.1567) -> (-545.35, 188.1567)
  line L252 (-549.35, 188.1567) -> (-549.35, 192.1567) construction
  line L253 (-549.35, 192.1567) -> (-560.55, 192.1567) construction
  line L254 (-560.55, 188.1567) -> (-549.35, 192.1567) construction
  line L255 (-549.35, 188.1567) -> (-560.55, 192.1567) construction
  line L256 (-564.55, 195.1567) -> (-564.55, 212)
  circle A92 centre (-147.0796, 398.1567) radius 2
  circle A93 centre (-147.0796, 198.1567) radius 2
  circle A94 centre (-147.0796, -1.8433) radius 2
  circle A95 centre (-447.0796, 398.1567) radius 2
  circle A96 centre (-447.0796, 198.1567) radius 2
  circle A97 centre (-447.0796, -1.8433) radius 2
  circle A98 centre (-747.0796, 398.1567) radius 2 construction
  circle A99 centre (-747.0796, 198.1567) radius 2
  circle A100 centre (-747.0796, -1.8433) radius 2 construction
  line L257 (-264.55, 388.1567) -> (-245.35, 388.1567)
  line L258 (-245.35, 388.1567) -> (-245.35, 392.1567)
  line L259 (-245.35, 392.1567) -> (-261.55, 392.1567)
  arc A101 (-264.55, 395.1567) -> (-261.55, 392.1567) centre (-261.55, 395.1567) ccw
  line L260 (-260.55, 388.1567) -> (-249.35, 388.1567) construction
  line L261 (-249.35, 388.1567) -> (-249.35, 392.1567) construction
  line L262 (-249.35, 392.1567) -> (-260.55, 392.1567) construction
  line L263 (-260.55, 392.1567) -> (-260.55, 388.1567) construction
  line L264 (-260.55, 388.1567) -> (-249.35, 392.1567) construction
  line L265 (-249.35, 388.1567) -> (-260.55, 392.1567) construction
  line L266 (-264.55, 412) -> (-264.55, 395.1567)
  arc A102 (-157.0796, 106.4587) -> (-171.0796, 106.4587) centre (-164.0796, 106.4587) ccw
  line L267 (-157.0796, 106.4587) -> (-157.0796, 100)
  arc A103 (-157.0796, 306.4587) -> (-171.0796, 306.4587) centre (-164.0796, 306.4587) ccw
  line L268 (-157.0796, 306.4587) -> (-157.0796, 300)
  arc A104 (-157.0796, 506.4587) -> (-171.0796, 506.4587) centre (-164.0796, 506.4587) ccw
  line L269 (-157.0796, 506.4587) -> (-157.0796, 500)
  arc A105 (-457.0796, 106.4587) -> (-471.0796, 106.4587) centre (-464.0796, 106.4587) ccw
  line L270 (-457.0796, 106.4587) -> (-457.0796, 100)
  arc A106 (-457.0796, 306.4587) -> (-471.0796, 306.4587) centre (-464.0796, 306.4587) ccw
  line L271 (-457.0796, 306.4587) -> (-457.0796, 300)
  arc A107 (-457.0796, 506.4587) -> (-471.0796, 506.4587) centre (-464.0796, 506.4587) ccw construction
  line L272 (-457.0796, 506.4587) -> (-457.0796, 500) construction
  point P0 (158.3765, 0)
  point P1 (-148.021, 75)
  point P2 (-128.5398, 50)
  point P3 (-95.6611, 25)
  point P4 (-51.1799, 6.6987)
  point P5 (-155.8997, 93.3013)
  point P6 (-148.021, 275)
  point P7 (-128.5398, 250)
  point P8 (-95.6611, 225)
  point P9 (-51.1799, 206.6987)
  point P10 (-157.0796, 303.4587)
  point P11 (-157.0796, 200)
  point P12 (-171.0796, 303.4587)
  point P13 (-6, 188.1567)
  point P14 (-142.7917, 285.4273)
  point P15 (-148.021, 475)
  point P16 (-128.5398, 450)
  point P17 (-95.6611, 425)
  point P18 (-51.1799, 406.6987)
  point P19 (-157.0796, 503.4587)
  point P20 (-157.0796, 400)
  point P21 (-171.0796, 503.4587)
  point P22 (-6, 388.1567)
  point P23 (-142.7917, 485.4273)
  point P24 (-448.021, 75)
  point P25 (-428.5398, 50)
  point P26 (-395.6611, 25)
  point P27 (-351.1799, 6.6987)
  point P28 (-457.0796, 103.4587)
  point P29 (-457.0796, 0)
  point P30 (-471.0796, 103.4587)
  point P31 (-306, -11.8433)
  point P32 (-442.7917, 85.4273)
  point P33 (-448.021, 275)
  point P34 (-428.5398, 250)
  point P35 (-395.6611, 225)
  point P36 (-351.1799, 206.6987)
  point P37 (-457.0796, 303.4587)
  point P38 (-457.0796, 200)
  point P39 (-471.0796, 303.4587)
  point P40 (-306, 188.1567)
  point P41 (-442.7917, 285.4273)
  point P42 (-448.021, 475)
  point P43 (-428.5398, 450)
  point P44 (-395.6611, 425)
  point P45 (-351.1799, 406.6987)
  point P46 (-457.0796, 503.4587)
  point P47 (-457.0796, 400)
  point P48 (-471.0796, 503.4587)
  point P49 (-306, 388.1567)
  point P50 (-442.7917, 485.4273)
  point P51 (-421.2258, 50.7726)
  point P52 (-392.6255, 29.6644)
  point P53 (-346.6709, 11.6004)
  point P54 (-436.0267, 68.102)
  point P55 (-457.0796, 503.4587)
  point P56 (-504.6796, 390.1567)
  point P57 (-606, 188.1567)
  point P58 (-757.0796, 200)
  point P59 (-748.021, 275)
  point P60 (-728.5398, 250)
  point P61 (-757.0796, 303.4587)
  point P62 (-695.6611, 225)
  point P63 (-651.1799, 206.6987)
  point P64 (-742.7917, 285.4273)
  point P65 (-771.0796, 303.4587)
  point P66 (-804.6796, 190.1567)
  point P67 (-564.55, 188.1567)
  point P68 (-554.95, 190.1567)
  point P69 (-254.95, 390.1567)
  point P70 (-278.75, 12)
  dimension "d43" = 25.75
  dimension "diameter" = 100
  dimension "d8" = 26.1799
  dimension "d14" = 30
  dimension "d15" = 30
  dimension "d16" = 30
  dimension "d32" = 10.625
  dimension "d47" = 8
  dimension "d49" = 2
  dimension "d53" = 21.25
  dimension "d62" = 20.825
  dimension "d123" = 120
  dimension "d126" = 59.109
  dimension "d137" = 2
  dimension "d138" = 90
  dimension "d139" = 90
  dimension "d141" = 7.1
  dimension "d142" = 14
  dimension "d143" = 7.1
  dimension "d144" = 12
  dimension "d145" = 5
  dimension "d146" = 35
  dimension "d147" = 24
  dimension "hole" = 4
  dimension "d155" = 4
  dimension "d156" = 9
  dimension "d157" = 4
  dimension "d158" = 6
  dimension "d159" = 4
  dimension "d160" = 4
  dimension "d241" = 120.891
  dimension "d244" = 120
  dimension "d245" = 30
  dimension "d246" = 3
  dimension "d249" = 200
  dimension "d252" = 300
  dimension "d255" = 120
  dimension "d256" = 5.1701
  dimension "d259" = 0.5
  dimension "d260" = 0.5
  dimension "d261" = 120
  dimension "d262" = 120
  dimension "d264" = 5.1701
  dimension "d265" = 38
  dimension "d268" = 300
  dimension "d275" = 200
  dimension "d288" = 5.1701
  dimension "d289" = 5.1701
  dimension "d290" = 5.1701
  dimension "d291" = 5.1701
  dimension "d292" = 11.2
  dimension "d293" = 4
  dimension "d294" = 4
  dimension "d296" = 3
  dimension "d299" = 300
  dimension "d324" = 11.2
  dimension "d325" = 4
  dimension "d326" = 4
  dimension "d328" = 3
  dimension "d330" = 4
  dimension "d331" = 10
  dimension "d332" = 10
  dimension "d335" = 200
  dimension "d338" = 300
  dimension "d341" = 7.1
  dimension "d342" = 4.6
sketch "Sketch5" plane through (0, 0, 0) normal (0, 0, 1) x (1, 0, 0)
  circle A0 centre (-171.0796, 114.7323) radius 2
  arc A1 (-168.5126, 119.023) -> (-173.6466, 110.4415) centre (-171.0796, 114.7323) ccw construction
  line L0 (-173.6466, 110.4415) -> (-168.5126, 119.023) construction
  line L1 (-137.3368, 94.5451) -> (-171.0796, 114.7323) construction
  line L2 (-137.3368, 94.5451) -> (-143.2815, 84.6085) construction
  line L3 (-141.0754, 84.4005) -> (-135.6205, 93.5183) construction
  line L4 (-142.7917, 85.4273) -> (-141.0754, 84.4005) construction
  line L5 (-173.6466, 110.4415) -> (-138.1875, 89.2276) construction
  line L6 (-138.1875, 89.2276) -> (-133.0535, 97.8091)
  line L7 (-133.0535, 97.8091) -> (-168.5126, 119.023) construction
  line L8 (-159.6382, 113.7138) -> (-159.6382, 107.8873)
  line L9 (-159.6382, 107.8873) -> (-145.3456, 99.3365)
  line L10 (-133.0535, 97.8091) -> (-140.2116, 102.0915)
  line L11 (-152.4919, 103.6119) -> (-153.6918, 101.6062)
  line L12 (-140.2116, 102.0915) -> (-145.3456, 99.3365)
  line L13 (-159.6382, 113.7138) -> (-168.5126, 119.023)
  line L14 (-135.6205, 93.5183) -> (-169.3633, 113.7055) construction
  line L15 (-168.5126, 119.023) -> (-189.9664, 131.858)
  arc A2 (-189.9664, 131.858) -> (-195.1004, 123.2766) centre (-192.5334, 127.5673) ccw
  line L16 (-195.1004, 123.2766) -> (-173.6466, 110.4415)
  line L17 (-142.7917, 85.4273) -> (-141.0754, 84.4005)
  line L18 (-141.0754, 84.4005) -> (-138.1875, 89.2276)
  line L19 (-142.7917, 85.4273) -> (-142.6907, 91.9217)
  line L20 (-142.6907, 91.9217) -> (-173.6466, 110.4415)
  arc A3 (-141.0754, 84.4005) -> (-138.014, 141.6941) centre (-171.0796, 114.7323) ccw construction
  point P0 (0, 0)
  dimension "d346" = 4
  dimension "d347" = 3
  dimension "d356" = 25
  dimension "d357" = 120
extrude "Extrusion6" add sketch "Sketch3" along normal blind 3 contours L107 A105 L270 L162 L163 L165 L164 L160 L161 L166 L167 S6 L190 A74 A48 L111 L113 L168 L119 L116 A50 L117 L118
sketch "Sketch6" plane through (0, 0, 0) normal (0, 0, -1) x (-1, 0, 0)
  line L0 (285.375, -11.8433) -> (285.375, -9.8433) projected
  line L1 (293.375, -11.8433) -> (293.375, -9.8433) projected
  arc A0 (293.375, -9.8433) -> (285.375, -9.8433) centre (289.375, -9.8433) ccw
  line L2 (285.375, -11.8433) -> (293.375, -11.8433)
  line L3 (495.0796, -11.8433) -> (264.55, -11.8433) projected
  point P0 (0, 0)
extrude "Extrusion7" cut sketch "Sketch6" against normal through all
properties part number "4cycloidrail"
